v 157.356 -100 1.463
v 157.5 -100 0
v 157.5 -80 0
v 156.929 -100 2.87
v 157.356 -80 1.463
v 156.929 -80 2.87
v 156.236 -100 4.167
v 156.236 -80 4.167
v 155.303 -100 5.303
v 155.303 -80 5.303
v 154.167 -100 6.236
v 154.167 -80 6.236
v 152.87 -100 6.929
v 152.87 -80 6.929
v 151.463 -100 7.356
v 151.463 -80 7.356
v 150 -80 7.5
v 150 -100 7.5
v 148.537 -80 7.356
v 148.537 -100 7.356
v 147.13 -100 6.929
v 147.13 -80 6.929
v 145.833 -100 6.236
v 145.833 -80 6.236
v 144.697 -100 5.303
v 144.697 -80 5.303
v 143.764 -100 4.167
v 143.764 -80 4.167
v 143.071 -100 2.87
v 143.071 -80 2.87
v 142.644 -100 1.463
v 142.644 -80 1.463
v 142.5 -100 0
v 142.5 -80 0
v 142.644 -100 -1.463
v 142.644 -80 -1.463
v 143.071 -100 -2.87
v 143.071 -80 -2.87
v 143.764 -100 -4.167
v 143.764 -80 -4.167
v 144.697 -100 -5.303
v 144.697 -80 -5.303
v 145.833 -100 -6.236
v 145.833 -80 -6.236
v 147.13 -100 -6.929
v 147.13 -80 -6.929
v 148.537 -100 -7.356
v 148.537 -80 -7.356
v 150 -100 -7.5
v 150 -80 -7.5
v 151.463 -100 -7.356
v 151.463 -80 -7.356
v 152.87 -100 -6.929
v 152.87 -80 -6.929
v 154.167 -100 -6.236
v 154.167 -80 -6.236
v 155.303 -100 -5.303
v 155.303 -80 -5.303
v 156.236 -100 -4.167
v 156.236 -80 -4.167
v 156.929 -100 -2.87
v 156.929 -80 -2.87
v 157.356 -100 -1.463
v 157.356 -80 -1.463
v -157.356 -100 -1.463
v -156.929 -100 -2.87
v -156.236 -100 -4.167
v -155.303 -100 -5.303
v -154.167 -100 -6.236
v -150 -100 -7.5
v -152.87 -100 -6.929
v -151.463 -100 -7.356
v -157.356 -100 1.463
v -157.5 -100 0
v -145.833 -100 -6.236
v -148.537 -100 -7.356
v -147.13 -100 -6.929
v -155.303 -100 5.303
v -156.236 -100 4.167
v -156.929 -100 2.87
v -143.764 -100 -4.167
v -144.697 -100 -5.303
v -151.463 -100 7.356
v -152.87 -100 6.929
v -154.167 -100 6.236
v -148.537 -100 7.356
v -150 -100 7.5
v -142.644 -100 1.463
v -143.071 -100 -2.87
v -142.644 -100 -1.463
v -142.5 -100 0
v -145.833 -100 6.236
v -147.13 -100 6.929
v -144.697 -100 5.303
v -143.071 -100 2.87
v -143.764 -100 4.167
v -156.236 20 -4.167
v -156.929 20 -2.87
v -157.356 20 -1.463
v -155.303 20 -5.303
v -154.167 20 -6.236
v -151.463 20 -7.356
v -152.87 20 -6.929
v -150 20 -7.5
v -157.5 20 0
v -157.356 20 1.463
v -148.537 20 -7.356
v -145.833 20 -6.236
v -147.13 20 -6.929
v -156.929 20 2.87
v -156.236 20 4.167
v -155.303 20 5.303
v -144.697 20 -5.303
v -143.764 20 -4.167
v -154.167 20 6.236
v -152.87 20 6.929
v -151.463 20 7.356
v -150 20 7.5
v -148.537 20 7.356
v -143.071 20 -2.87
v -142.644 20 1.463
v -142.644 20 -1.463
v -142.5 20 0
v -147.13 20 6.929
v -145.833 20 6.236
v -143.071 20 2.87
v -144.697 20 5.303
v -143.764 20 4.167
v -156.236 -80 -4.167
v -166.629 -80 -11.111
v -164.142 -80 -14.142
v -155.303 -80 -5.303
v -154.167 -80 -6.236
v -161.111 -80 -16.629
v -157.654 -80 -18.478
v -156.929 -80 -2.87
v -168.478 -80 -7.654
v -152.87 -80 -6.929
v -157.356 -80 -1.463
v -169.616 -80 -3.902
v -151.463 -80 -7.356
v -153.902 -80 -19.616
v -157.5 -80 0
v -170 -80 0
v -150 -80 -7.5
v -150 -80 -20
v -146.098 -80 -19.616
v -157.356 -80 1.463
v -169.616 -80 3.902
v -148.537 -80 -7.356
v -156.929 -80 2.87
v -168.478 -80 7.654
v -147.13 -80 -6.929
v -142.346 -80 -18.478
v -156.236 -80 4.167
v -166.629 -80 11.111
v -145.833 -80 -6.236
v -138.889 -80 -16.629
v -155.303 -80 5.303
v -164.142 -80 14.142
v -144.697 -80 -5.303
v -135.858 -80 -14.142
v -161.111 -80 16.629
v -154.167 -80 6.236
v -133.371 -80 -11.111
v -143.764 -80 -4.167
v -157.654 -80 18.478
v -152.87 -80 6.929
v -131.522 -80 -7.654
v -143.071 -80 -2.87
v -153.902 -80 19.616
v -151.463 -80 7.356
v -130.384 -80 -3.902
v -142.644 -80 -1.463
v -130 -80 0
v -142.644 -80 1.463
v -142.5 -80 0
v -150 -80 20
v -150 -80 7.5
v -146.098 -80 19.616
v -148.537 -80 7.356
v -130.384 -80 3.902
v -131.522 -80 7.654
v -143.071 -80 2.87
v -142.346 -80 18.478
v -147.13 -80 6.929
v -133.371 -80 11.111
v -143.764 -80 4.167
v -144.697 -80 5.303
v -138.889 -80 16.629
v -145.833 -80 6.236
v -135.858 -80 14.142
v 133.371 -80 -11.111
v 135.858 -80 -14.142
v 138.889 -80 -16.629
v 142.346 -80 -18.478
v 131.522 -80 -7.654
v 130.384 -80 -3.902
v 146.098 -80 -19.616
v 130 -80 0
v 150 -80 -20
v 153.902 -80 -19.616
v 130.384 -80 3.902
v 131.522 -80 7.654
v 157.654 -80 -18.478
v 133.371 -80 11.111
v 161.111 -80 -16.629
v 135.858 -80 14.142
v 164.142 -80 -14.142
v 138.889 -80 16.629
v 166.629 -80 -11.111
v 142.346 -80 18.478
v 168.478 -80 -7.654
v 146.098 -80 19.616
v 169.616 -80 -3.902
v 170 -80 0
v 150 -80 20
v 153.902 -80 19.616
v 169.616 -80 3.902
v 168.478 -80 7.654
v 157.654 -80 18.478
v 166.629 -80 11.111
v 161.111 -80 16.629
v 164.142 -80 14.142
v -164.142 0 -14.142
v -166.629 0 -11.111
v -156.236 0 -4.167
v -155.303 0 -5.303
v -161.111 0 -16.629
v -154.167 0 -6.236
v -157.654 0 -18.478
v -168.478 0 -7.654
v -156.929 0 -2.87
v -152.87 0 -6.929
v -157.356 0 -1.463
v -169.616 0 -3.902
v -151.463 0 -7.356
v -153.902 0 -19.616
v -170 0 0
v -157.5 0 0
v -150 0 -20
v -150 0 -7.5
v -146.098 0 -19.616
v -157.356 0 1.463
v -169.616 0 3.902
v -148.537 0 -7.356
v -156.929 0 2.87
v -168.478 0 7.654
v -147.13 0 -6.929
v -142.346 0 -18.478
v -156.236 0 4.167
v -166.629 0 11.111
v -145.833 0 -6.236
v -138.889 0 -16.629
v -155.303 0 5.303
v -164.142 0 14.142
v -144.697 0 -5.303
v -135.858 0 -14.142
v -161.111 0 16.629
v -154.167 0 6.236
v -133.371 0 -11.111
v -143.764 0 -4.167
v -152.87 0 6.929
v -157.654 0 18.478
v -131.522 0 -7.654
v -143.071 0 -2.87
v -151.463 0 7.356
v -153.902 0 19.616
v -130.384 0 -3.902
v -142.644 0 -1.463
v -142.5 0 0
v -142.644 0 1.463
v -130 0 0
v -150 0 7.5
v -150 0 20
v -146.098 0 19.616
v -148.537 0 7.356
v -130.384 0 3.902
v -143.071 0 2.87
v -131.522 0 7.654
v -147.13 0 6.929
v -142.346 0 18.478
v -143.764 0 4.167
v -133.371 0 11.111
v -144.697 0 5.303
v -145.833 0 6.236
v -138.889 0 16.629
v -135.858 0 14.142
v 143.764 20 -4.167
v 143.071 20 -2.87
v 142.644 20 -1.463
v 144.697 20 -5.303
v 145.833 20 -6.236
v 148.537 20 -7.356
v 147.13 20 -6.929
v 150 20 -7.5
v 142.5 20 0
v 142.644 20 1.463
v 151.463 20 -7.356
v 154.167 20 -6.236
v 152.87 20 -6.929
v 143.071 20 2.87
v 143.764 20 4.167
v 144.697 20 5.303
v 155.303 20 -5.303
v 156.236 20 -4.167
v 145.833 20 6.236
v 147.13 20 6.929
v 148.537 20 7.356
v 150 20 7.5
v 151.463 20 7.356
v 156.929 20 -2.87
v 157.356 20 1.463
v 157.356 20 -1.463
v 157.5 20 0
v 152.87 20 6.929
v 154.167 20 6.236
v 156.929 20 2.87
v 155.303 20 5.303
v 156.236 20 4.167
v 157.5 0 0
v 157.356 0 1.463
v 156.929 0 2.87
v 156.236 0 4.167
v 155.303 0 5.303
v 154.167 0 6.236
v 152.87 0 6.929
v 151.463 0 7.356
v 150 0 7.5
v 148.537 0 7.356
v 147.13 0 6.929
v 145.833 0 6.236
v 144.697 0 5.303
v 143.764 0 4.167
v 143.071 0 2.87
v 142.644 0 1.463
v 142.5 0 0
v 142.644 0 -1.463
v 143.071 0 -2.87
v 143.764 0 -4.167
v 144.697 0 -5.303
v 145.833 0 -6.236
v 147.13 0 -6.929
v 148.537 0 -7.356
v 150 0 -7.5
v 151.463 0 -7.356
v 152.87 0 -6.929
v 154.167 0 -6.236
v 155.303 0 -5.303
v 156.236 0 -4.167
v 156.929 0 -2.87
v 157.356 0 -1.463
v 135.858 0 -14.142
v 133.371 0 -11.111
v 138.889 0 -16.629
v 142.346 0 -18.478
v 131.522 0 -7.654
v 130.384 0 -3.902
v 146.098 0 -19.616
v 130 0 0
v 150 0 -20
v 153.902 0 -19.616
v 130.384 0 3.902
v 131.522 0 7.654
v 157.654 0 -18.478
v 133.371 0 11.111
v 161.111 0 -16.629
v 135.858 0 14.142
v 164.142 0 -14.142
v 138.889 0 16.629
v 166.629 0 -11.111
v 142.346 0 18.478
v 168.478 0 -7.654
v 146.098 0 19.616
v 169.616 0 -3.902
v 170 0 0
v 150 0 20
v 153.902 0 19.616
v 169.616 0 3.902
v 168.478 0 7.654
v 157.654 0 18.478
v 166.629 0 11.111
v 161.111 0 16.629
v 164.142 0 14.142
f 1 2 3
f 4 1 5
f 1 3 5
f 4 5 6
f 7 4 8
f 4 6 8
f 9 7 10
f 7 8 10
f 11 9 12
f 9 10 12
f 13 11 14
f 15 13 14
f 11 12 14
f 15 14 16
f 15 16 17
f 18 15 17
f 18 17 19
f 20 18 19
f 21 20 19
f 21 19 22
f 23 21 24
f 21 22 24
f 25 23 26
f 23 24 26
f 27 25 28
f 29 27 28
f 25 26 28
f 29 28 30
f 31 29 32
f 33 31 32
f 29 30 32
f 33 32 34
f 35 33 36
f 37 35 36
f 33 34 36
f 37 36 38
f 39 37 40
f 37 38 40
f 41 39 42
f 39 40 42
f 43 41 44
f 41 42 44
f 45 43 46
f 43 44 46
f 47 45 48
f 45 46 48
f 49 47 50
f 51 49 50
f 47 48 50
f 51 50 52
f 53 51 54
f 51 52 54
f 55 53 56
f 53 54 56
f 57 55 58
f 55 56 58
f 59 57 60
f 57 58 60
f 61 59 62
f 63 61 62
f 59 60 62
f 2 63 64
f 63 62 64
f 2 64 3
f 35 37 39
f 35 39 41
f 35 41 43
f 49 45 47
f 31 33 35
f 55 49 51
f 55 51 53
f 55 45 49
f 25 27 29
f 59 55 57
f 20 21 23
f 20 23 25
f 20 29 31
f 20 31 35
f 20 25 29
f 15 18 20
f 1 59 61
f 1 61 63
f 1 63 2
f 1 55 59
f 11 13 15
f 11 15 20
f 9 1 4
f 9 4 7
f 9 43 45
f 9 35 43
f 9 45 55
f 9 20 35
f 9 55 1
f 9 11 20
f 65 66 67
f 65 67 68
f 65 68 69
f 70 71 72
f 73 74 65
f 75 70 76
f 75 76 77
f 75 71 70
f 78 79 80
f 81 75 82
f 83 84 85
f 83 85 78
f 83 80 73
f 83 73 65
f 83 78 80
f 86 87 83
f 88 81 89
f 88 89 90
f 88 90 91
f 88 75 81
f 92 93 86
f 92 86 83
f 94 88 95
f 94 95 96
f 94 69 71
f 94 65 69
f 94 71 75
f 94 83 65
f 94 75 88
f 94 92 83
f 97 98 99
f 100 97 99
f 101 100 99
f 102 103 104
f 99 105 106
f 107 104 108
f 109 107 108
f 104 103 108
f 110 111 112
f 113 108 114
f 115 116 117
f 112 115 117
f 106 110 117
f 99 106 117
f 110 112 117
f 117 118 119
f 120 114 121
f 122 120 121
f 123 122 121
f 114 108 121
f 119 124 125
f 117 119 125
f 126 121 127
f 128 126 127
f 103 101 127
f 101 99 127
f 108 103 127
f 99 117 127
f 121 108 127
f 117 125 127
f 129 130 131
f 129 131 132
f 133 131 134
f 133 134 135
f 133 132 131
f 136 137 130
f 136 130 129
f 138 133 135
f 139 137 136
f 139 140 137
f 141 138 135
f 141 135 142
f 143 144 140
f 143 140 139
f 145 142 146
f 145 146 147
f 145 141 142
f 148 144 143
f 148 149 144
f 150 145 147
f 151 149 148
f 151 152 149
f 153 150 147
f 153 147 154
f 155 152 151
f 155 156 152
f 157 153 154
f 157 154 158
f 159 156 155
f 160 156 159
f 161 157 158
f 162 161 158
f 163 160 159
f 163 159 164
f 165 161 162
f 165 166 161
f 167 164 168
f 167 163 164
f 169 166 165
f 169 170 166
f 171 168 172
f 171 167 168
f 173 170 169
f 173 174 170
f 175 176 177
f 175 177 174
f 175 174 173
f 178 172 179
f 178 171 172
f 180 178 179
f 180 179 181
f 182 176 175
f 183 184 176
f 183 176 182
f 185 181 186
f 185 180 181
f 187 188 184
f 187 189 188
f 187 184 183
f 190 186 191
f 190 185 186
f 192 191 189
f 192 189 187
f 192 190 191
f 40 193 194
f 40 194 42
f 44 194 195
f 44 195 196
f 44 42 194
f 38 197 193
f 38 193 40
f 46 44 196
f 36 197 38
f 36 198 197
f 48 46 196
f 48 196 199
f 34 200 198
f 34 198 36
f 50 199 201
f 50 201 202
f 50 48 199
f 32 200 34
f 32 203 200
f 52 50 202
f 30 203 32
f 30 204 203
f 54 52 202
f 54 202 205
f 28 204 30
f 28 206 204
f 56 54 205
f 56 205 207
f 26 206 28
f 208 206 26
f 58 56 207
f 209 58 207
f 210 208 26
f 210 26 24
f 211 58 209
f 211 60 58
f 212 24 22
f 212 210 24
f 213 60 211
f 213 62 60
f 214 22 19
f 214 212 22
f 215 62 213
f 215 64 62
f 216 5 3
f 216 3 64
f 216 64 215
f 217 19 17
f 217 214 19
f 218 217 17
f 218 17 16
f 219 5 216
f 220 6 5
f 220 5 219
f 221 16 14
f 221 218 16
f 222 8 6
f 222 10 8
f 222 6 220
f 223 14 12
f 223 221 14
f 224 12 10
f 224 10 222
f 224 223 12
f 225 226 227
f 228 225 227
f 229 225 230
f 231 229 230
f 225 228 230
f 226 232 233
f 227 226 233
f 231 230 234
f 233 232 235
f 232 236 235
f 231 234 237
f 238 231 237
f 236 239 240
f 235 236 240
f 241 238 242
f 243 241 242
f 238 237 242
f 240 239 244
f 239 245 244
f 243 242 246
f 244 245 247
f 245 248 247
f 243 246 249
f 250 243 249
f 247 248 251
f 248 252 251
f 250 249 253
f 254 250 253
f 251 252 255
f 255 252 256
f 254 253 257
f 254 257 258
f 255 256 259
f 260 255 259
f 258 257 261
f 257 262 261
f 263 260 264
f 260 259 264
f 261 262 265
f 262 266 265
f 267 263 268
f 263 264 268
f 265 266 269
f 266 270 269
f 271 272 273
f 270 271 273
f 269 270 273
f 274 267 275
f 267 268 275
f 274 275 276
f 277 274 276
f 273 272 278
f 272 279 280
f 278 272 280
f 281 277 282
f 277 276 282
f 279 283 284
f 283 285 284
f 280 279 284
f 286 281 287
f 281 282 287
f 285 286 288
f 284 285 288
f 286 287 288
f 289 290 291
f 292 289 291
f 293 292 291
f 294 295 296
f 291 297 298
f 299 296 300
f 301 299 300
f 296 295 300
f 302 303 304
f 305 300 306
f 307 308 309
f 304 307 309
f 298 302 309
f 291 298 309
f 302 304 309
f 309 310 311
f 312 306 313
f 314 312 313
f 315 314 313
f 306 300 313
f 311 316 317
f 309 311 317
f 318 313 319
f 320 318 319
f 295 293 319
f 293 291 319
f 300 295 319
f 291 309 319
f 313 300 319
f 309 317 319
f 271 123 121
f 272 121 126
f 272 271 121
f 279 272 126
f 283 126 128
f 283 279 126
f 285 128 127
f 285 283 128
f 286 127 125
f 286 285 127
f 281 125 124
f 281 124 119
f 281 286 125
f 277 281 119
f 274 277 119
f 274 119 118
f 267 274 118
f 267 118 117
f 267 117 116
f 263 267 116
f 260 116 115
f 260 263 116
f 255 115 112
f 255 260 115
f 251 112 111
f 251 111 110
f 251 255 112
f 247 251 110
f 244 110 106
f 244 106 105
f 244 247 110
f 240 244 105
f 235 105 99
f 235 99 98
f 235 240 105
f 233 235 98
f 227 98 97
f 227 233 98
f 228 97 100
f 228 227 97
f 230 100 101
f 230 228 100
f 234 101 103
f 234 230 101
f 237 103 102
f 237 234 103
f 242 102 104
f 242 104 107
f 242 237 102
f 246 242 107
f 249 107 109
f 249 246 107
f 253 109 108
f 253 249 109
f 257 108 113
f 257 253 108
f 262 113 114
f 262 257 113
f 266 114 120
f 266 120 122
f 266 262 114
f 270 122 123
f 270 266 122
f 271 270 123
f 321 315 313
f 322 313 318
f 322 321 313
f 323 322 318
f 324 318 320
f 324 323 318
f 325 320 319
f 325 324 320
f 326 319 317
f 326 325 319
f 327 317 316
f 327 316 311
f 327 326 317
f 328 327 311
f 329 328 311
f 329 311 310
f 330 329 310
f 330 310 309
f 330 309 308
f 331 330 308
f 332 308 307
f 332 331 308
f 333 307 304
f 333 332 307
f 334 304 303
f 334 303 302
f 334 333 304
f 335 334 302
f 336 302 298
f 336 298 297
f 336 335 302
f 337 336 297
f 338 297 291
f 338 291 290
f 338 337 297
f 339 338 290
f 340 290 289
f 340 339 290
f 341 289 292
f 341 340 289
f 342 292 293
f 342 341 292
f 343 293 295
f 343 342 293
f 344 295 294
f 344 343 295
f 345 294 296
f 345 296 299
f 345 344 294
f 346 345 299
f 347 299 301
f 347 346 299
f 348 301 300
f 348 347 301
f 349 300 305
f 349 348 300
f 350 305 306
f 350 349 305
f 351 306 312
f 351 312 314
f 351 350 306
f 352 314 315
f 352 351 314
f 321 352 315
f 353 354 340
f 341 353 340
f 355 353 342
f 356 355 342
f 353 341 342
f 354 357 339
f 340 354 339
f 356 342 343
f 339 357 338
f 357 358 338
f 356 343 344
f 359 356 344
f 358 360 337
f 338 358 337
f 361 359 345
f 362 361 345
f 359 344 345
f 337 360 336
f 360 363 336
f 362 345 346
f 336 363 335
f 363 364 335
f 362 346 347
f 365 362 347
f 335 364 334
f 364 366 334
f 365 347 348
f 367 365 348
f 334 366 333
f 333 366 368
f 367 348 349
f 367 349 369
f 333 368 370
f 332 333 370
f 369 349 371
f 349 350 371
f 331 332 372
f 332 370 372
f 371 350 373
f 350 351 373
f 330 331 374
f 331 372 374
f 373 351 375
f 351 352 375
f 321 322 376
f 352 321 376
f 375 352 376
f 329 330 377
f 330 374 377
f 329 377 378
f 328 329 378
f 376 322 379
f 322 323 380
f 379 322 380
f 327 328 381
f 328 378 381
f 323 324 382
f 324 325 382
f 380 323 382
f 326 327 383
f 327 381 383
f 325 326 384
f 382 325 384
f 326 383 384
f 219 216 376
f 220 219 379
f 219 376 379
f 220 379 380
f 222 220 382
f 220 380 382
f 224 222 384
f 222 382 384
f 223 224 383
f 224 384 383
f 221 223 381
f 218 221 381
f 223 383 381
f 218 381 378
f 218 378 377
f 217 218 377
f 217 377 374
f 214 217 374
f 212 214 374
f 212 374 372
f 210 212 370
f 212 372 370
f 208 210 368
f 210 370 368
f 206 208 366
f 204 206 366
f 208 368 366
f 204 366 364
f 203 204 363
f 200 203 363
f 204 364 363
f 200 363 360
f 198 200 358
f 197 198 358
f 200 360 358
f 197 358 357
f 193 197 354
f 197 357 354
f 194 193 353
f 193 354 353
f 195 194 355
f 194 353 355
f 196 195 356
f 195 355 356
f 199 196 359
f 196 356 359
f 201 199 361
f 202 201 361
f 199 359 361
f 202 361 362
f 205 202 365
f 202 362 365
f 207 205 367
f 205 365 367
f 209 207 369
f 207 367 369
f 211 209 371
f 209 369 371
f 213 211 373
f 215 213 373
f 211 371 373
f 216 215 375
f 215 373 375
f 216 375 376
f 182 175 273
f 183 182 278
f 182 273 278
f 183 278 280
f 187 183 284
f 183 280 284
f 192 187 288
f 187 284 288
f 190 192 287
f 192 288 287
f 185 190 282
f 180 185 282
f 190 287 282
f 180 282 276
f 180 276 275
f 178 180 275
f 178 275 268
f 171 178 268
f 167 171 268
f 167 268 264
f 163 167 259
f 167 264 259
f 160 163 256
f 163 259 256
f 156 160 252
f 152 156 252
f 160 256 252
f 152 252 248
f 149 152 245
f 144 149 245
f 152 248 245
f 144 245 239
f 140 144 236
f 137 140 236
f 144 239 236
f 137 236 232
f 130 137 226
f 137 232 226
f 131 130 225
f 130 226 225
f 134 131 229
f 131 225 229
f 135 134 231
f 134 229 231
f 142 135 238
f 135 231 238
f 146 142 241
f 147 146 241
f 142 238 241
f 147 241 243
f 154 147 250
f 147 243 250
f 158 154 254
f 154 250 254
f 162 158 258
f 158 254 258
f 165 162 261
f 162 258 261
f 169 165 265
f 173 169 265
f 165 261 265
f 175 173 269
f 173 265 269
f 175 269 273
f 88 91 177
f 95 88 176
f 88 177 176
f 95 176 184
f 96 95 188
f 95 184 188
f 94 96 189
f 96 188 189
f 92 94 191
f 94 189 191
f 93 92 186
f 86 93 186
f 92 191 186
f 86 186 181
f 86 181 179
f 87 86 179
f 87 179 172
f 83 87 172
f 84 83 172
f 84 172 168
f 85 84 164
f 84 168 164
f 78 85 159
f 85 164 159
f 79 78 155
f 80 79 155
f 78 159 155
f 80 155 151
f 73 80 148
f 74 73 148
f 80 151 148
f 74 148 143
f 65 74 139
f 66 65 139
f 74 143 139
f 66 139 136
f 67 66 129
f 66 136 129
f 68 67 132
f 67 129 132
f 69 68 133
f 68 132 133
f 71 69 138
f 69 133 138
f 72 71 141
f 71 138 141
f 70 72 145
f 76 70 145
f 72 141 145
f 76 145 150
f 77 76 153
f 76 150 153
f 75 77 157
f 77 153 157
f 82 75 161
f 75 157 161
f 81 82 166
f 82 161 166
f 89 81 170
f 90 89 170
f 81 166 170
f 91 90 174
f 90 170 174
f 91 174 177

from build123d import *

# Parameters (mm, degrees)
F0_R      = 20
F1_DEPTH  = 80
F2_DEPTH  = 80
F3_R      = 7.5
F4_DEPTH  = 20
F5_R      = 7.5
F6_DEPTH  = 20
F7_R      = 7.5
F8_DEPTH  = 20
F9_R      = 7.5
F10_DEPTH = 20


with BuildPart() as f1:
    # F0 (on Front) → F1 (new body)
    with BuildSketch(Plane.XZ):
        with Locations((-150, 0)):
            Circle(F0_R)
    extrude(amount=F1_DEPTH)

    # F3 (on face) → F4 (join)
    with BuildSketch(Plane.XZ.offset(80)):
        with Locations((-150, 0)):
            Circle(F3_R)
    extrude(amount=F4_DEPTH)

    # F5 (on face) → F6 (join)
    with BuildSketch(Plane.XZ):
        with Locations((-150, 0)):
            Circle(F5_R)
    extrude(amount=-F6_DEPTH)


with BuildPart() as f2:
    # F0 (on Front) → F2 (new body)
    with BuildSketch(Plane.XZ):
        with Locations((150, 0)):
            Circle(F0_R)
    extrude(amount=F2_DEPTH)

    # F7 (on face) → F8 (join)
    with BuildSketch(Plane.XZ.offset(80)):
        with Locations((150, 0)):
            Circle(F7_R)
    extrude(amount=F8_DEPTH)

    # F9 (on face) → F10 (join)
    with BuildSketch(Plane.XZ):
        with Locations((150, 0)):
            Circle(F9_R)
    extrude(amount=-F10_DEPTH)


solid = Compound([f1.part, f2.part])
